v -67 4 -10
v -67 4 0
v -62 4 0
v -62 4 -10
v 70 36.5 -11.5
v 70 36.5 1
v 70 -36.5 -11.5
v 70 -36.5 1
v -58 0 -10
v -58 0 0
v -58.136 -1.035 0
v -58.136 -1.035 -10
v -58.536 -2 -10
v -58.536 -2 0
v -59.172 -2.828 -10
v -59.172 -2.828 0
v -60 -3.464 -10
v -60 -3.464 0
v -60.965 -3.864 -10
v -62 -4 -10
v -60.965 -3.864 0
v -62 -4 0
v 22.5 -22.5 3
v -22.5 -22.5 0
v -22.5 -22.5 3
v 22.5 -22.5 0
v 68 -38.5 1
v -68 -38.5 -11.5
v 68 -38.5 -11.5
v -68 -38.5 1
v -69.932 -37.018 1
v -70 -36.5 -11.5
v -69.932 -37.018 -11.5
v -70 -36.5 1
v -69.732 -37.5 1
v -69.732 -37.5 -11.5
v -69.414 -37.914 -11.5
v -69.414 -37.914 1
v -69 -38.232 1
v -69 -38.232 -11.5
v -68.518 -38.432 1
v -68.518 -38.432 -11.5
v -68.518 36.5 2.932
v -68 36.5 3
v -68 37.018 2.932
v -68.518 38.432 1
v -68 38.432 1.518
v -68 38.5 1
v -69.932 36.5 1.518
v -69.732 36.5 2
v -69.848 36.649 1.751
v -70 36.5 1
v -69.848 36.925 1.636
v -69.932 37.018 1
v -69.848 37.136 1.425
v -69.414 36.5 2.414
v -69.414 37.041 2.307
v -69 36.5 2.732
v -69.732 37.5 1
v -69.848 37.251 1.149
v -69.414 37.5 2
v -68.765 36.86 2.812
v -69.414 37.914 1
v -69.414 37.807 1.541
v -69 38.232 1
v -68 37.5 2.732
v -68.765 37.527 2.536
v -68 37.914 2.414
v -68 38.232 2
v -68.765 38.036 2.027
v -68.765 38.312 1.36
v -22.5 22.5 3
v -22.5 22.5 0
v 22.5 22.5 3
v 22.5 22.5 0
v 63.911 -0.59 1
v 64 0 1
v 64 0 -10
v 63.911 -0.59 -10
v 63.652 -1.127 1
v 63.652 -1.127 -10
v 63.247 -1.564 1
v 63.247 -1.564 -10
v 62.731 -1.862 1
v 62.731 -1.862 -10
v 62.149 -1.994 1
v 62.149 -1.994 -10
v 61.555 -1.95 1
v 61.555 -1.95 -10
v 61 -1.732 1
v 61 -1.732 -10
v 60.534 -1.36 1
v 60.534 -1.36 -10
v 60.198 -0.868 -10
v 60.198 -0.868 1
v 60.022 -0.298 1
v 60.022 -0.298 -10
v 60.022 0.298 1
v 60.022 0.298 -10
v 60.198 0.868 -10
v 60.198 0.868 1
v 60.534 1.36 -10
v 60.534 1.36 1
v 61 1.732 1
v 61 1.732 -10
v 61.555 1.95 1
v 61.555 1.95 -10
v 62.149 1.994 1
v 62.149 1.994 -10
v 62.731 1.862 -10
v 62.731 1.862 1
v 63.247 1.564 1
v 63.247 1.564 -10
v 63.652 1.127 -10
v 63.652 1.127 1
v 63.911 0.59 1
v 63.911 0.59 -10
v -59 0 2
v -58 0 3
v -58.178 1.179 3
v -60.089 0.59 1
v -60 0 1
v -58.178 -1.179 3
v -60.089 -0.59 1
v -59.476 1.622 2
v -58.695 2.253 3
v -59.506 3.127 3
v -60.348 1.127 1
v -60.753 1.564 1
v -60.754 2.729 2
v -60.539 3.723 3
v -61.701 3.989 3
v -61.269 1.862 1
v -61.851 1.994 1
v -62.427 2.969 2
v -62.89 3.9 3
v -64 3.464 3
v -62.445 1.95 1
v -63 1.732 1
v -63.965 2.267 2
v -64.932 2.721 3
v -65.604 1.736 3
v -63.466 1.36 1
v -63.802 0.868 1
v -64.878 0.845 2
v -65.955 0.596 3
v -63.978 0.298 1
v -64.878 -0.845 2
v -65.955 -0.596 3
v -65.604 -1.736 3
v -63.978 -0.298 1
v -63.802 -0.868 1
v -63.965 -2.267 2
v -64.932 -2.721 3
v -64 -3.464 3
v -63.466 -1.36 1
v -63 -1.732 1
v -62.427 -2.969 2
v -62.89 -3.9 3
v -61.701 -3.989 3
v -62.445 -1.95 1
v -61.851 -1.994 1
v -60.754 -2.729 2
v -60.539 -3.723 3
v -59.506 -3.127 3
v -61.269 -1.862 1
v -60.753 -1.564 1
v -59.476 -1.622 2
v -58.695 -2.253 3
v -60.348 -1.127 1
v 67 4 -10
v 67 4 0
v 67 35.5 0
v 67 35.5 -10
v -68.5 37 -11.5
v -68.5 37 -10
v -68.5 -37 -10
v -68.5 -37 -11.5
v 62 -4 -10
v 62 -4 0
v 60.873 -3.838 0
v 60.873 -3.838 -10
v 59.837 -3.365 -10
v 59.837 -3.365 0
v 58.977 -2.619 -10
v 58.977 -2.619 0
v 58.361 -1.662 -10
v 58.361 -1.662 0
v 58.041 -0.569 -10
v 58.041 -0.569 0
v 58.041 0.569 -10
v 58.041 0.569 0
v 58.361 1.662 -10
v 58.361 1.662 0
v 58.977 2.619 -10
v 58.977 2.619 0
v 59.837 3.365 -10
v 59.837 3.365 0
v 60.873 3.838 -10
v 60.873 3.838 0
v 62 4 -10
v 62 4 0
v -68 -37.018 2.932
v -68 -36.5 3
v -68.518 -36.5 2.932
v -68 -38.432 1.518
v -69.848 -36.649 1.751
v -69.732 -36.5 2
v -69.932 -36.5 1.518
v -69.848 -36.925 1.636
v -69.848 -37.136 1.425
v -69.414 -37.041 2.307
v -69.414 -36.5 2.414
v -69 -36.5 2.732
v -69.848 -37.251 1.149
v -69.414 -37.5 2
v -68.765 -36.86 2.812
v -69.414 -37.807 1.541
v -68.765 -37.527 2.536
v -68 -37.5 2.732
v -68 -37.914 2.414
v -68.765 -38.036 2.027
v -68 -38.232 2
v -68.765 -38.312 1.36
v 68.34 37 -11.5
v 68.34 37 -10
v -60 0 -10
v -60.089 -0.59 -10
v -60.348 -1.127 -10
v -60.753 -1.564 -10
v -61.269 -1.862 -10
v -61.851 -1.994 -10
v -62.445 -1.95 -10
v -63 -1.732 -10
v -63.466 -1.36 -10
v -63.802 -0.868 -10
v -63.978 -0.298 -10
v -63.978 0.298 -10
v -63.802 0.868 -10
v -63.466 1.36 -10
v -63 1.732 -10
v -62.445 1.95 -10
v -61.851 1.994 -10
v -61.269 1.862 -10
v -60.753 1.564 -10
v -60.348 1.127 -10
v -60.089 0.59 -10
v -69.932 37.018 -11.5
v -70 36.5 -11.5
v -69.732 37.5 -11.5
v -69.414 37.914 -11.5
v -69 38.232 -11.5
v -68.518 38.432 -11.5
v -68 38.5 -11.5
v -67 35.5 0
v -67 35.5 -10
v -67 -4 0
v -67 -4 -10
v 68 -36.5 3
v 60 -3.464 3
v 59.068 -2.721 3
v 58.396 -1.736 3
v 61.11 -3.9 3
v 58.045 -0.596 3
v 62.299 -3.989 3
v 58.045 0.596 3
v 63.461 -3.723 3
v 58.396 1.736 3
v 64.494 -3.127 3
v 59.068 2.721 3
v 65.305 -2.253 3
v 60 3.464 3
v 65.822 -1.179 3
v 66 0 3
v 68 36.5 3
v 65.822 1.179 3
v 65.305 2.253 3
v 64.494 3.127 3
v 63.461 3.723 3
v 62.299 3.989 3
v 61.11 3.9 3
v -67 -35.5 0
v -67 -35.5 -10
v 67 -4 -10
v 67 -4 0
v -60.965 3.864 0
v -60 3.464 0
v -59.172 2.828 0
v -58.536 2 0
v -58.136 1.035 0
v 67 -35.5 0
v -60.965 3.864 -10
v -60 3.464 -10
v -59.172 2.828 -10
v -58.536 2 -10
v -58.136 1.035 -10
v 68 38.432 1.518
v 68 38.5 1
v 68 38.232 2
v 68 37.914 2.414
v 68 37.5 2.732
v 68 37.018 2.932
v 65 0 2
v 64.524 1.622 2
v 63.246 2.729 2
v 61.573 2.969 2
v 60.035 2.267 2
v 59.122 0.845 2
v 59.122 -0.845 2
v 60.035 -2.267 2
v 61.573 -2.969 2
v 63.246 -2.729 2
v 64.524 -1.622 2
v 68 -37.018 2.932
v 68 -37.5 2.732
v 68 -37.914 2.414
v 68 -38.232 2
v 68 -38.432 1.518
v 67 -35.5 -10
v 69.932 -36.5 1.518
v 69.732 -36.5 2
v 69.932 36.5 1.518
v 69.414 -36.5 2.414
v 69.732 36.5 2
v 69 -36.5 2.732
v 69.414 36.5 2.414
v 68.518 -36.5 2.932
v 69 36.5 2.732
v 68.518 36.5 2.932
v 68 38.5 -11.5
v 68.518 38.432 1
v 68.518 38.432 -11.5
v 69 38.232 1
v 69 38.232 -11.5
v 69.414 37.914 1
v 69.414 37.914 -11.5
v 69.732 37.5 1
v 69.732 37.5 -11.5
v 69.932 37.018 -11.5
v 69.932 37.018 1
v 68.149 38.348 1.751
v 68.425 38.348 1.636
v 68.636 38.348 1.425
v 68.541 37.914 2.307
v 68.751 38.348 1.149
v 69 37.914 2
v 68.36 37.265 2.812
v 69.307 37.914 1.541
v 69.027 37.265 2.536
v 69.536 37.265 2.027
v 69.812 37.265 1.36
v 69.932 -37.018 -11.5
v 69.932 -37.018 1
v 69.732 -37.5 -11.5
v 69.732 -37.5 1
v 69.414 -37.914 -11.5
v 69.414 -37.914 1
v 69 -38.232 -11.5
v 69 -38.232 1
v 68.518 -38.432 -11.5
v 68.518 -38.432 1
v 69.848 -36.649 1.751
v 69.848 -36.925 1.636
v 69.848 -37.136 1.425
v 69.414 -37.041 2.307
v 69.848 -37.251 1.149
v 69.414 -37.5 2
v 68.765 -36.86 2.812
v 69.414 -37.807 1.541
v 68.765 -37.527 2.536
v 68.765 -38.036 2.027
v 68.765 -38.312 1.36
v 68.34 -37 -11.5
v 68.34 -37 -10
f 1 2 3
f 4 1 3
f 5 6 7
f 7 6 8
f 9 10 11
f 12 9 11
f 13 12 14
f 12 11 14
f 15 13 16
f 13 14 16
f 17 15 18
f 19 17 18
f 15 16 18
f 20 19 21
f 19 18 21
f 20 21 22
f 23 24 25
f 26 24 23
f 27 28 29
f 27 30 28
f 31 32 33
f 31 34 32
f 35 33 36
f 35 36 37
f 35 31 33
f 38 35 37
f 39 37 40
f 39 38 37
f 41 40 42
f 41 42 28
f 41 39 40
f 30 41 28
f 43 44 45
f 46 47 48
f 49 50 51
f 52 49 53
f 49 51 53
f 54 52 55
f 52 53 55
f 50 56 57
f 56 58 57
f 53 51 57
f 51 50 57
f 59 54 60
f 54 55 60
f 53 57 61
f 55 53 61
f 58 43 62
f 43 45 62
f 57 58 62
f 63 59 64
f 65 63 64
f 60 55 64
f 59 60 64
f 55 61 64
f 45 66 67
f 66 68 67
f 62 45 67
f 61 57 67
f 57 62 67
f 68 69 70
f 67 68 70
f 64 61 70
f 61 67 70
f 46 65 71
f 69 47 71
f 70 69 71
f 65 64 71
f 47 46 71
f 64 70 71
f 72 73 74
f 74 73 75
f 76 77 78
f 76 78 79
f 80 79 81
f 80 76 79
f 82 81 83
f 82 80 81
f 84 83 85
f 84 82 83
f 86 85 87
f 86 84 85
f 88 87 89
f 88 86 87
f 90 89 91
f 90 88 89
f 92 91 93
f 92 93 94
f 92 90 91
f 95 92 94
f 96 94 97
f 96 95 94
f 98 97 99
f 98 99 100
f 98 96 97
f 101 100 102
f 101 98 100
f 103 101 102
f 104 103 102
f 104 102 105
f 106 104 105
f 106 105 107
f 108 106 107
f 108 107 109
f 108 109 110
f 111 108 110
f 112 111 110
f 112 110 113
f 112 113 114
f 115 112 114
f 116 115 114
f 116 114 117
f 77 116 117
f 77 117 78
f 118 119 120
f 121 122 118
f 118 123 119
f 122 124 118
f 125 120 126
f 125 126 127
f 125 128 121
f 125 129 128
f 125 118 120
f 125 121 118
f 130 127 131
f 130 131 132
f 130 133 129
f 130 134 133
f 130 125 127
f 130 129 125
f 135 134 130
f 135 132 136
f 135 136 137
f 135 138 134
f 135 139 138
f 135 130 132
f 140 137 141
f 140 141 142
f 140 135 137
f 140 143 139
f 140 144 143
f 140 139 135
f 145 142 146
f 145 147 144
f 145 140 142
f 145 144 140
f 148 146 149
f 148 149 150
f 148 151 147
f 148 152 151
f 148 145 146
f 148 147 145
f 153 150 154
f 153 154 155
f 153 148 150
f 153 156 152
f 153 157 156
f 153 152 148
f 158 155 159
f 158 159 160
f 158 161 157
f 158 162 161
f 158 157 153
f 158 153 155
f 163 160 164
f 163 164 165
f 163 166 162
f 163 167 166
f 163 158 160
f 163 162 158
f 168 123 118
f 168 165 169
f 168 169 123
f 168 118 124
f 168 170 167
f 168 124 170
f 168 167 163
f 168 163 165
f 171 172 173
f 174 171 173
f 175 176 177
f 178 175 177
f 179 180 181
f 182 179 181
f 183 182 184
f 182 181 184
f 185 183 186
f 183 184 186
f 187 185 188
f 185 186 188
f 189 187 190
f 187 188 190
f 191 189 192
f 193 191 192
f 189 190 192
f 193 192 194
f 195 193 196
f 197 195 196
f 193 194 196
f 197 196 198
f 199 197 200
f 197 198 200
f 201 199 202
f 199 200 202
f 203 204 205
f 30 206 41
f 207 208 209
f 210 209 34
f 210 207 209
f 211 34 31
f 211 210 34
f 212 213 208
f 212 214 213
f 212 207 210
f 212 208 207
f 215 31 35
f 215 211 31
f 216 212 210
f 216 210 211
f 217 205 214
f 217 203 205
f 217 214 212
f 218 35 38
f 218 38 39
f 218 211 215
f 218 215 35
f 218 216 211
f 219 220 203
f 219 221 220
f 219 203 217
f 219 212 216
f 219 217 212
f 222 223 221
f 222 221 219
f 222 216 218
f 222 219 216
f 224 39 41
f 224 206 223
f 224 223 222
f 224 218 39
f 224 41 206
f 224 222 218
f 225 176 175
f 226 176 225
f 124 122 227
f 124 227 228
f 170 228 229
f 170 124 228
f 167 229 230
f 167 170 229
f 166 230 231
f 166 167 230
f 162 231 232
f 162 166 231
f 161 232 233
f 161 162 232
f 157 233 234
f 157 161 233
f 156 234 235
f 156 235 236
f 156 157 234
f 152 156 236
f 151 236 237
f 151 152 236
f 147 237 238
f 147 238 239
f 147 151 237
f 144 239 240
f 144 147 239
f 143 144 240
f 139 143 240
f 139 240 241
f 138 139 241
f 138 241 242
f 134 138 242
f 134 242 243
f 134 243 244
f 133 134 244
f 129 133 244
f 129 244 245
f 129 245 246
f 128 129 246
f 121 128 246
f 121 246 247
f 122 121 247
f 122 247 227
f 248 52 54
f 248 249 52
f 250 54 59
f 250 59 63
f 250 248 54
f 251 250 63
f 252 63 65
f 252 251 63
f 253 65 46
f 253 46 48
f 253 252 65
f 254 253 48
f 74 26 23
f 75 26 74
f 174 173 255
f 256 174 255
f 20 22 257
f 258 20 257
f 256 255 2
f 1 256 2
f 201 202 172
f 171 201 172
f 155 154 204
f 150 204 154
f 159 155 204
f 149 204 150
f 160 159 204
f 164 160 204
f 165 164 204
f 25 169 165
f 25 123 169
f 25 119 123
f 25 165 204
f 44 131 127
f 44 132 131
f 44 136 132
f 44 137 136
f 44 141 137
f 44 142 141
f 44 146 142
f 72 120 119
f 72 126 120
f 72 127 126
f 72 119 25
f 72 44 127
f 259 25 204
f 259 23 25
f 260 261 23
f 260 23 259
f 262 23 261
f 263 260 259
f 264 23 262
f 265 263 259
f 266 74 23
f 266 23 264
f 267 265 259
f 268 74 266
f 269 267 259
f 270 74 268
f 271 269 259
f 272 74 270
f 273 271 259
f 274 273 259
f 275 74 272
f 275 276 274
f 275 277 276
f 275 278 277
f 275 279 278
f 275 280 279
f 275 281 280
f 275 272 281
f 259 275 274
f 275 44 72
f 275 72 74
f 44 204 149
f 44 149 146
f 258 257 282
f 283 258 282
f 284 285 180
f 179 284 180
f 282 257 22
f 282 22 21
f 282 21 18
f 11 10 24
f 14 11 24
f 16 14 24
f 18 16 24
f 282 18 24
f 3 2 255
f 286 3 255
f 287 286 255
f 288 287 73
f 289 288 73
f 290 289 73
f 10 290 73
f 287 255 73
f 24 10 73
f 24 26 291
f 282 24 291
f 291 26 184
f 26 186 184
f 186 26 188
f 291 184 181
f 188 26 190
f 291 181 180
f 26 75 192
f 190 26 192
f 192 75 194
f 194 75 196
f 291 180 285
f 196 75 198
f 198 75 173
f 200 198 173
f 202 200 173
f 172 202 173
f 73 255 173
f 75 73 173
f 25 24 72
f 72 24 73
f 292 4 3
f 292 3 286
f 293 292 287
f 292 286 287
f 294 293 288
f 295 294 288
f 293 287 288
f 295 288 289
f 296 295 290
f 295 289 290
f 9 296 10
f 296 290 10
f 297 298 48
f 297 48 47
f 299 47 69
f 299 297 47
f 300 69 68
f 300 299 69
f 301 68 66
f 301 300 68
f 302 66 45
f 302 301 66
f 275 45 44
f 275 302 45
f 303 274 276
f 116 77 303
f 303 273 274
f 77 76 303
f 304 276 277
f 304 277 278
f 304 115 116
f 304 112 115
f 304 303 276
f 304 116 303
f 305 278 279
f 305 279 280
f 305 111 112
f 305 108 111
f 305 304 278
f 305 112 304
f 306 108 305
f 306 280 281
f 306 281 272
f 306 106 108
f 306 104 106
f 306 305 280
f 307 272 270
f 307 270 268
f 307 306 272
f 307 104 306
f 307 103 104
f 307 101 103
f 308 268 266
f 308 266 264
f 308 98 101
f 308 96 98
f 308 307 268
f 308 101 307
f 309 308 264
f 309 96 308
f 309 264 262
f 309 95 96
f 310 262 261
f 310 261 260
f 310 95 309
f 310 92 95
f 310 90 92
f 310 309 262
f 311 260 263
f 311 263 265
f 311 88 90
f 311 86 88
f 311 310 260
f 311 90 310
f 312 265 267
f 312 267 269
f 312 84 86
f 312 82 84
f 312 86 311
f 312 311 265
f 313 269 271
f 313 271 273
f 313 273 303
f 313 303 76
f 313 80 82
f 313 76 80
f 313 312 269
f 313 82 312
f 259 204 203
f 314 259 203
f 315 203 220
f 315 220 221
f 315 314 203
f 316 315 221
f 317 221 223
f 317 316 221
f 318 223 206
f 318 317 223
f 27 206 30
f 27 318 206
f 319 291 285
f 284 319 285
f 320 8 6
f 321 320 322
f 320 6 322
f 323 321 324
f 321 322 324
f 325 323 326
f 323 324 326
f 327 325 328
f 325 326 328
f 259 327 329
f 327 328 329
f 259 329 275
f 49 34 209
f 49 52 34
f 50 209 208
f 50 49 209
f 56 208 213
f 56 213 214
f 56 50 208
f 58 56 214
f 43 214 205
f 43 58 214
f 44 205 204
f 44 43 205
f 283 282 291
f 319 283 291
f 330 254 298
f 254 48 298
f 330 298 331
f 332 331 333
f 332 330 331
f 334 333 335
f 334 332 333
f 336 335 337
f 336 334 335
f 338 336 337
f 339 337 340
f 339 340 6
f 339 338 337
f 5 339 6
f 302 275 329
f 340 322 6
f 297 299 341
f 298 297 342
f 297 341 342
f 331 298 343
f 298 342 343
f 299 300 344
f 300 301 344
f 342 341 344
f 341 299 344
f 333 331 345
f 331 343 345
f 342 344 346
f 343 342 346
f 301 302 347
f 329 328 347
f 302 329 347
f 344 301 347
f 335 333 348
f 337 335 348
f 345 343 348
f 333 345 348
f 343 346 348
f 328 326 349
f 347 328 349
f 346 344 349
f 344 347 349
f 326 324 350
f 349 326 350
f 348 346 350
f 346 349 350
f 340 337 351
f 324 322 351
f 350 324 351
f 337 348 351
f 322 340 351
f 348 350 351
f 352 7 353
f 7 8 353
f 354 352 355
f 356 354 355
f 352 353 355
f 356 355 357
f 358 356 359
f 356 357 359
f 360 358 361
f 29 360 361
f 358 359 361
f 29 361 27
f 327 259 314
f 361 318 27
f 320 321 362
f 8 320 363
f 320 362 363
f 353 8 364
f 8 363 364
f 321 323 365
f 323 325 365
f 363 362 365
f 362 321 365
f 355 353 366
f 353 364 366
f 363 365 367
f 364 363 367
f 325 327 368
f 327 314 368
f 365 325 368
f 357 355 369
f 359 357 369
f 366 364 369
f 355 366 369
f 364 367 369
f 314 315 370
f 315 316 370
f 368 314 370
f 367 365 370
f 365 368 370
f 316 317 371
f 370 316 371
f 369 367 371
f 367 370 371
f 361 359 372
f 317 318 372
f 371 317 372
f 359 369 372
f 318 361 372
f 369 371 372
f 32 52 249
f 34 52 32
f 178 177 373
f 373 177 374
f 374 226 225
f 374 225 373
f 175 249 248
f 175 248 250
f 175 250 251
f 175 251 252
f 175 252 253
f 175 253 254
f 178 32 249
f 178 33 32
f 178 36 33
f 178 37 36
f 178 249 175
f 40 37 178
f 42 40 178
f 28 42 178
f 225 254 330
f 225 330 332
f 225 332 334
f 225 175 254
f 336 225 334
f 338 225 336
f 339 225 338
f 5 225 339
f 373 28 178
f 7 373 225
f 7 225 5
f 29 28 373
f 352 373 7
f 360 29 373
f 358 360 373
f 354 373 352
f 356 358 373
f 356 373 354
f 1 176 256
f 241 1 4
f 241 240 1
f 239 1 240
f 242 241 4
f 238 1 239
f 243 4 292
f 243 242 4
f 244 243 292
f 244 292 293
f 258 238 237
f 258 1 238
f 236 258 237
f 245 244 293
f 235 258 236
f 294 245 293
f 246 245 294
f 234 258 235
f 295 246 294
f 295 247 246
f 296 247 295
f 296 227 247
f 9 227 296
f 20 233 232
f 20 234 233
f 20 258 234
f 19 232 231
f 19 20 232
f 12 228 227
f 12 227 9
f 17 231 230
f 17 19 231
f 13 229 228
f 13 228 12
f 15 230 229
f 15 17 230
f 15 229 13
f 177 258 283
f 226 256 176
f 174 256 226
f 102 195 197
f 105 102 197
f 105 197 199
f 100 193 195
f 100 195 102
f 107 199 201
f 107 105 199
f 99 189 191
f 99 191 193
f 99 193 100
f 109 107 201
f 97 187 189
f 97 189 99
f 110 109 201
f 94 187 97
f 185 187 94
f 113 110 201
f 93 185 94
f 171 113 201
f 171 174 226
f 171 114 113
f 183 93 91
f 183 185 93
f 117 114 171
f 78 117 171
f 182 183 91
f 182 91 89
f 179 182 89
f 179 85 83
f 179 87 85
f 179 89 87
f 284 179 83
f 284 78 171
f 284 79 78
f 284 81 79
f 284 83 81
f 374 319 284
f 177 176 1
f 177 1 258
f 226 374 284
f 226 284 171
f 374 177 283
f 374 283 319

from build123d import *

# Parameters (mm, degrees)
F0_W     = 140
F0_H     = 77
F0_R     = 4
F0_W_2   = 45
F0_H_2   = 45
F0_R_2   = 2
F1_DEPTH = 3
F2_W     = 140
F2_H     = 77
F2_R     = 2
F3_DEPTH = 10
F4_W     = 140
F4_H     = 77
F4_W_2   = 136.839989
F4_H_2   = 74
F5_DEPTH = 1.5
F6_R     = 2
F7_SIZE  = 2


with BuildPart() as f1:
    # F0 (on Top) → F1 (new body)
    with BuildSketch(Plane.XY):
        Rectangle(F0_W, F0_H)
        with Locations((-62, 0)):
            Circle(F0_R, mode=Mode.SUBTRACT)
        Rectangle(F0_W_2, F0_H_2, mode=Mode.SUBTRACT)
        with Locations((62, 0)):
            Circle(F0_R, mode=Mode.SUBTRACT)
        with Locations((-62, 0)):
            Circle(F0_R)
        with Locations((-62, 0)):
            Circle(F0_R_2, mode=Mode.SUBTRACT)
        with Locations((62, 0)):
            Circle(F0_R)
        with Locations((62, 0)):
            Circle(F0_R_2, mode=Mode.SUBTRACT)
    extrude(amount=F1_DEPTH)

    # F2 (on face) → F3 (join)
    with BuildSketch(Plane(origin=(0, 0, 0), x_dir=(1, 0, 0), z_dir=(0, 0, -1))):
        Rectangle(F2_W, F2_H)
        Polygon((-67, 4), (-67, 35.5), (67, 35.5), (67, 4), (67, -4), (67, -35.5), (-67, -35.5), (-67, -4), align=None, mode=Mode.SUBTRACT)
        with BuildLine():
            ThreePointArc((-58, 0), (-59.171573, 2.828427), (-62, 4))
            ThreePointArc((-62, 4), (-66, 0), (-62, -4))
            ThreePointArc((-62, -4), (-59.171573, -2.828427), (-58, 0))
        make_face()
        with Locations((-62, 0)):
            Circle(F2_R, mode=Mode.SUBTRACT)
        with BuildLine():
            ThreePointArc((66, 0), (64.828427, 2.828427), (62, 4))
            ThreePointArc((62, 4), (58, 0), (62, -4))
            ThreePointArc((62, -4), (64.828427, -2.828427), (66, 0))
        make_face()
        with Locations((62, 0)):
            Circle(F2_R, mode=Mode.SUBTRACT)
        with BuildLine():
            Line((-62, 4), (-67, 4))
            Line((-67, 4), (-67, -4))
            Line((-67, -4), (-62, -4))
            ThreePointArc((-62, -4), (-66, 0), (-62, 4))
        make_face()
        with BuildLine():
            Line((67, -4), (67, 4))
            Line((67, 4), (62, 4))
            ThreePointArc((62, 4), (64.828427, 2.828427), (66, 0))
            ThreePointArc((66, 0), (64.828427, -2.828427), (62, -4))
            Line((62, -4), (67, -4))
        make_face()
    extrude(amount=F3_DEPTH)

    # F4 (on face) → F5 (join)
    with BuildSketch(Plane(origin=(0, 0, -10), x_dir=(1, 0, 0), z_dir=(0, 0, -1))):
        Rectangle(F4_W, F4_H)
        with Locations((-0.080005, 0)):
            Rectangle(F4_W_2, F4_H_2, mode=Mode.SUBTRACT)
    extrude(amount=F5_DEPTH)

    # F6
    f6_edges = [f1.edges().sort_by_distance(p)[0] for p in [
        (0, -38.5, 3),
        (70, 0, 3),
        (0, 38.5, 3),
        (-70, 0, 3),
        (-70, 38.5, -4.25),
        (-70, -38.5, -4.25),
        (70, -38.5, -4.25),
        (70, 38.5, -4.25),
    ]]
    fillet(f6_edges, radius=F6_R)

    # F7
    f7_edges = [f1.edges().sort_by_distance(p)[0] for p in [
        (-64, 0, 3),
        (60, 0, 3),
    ]]
    chamfer(f7_edges, length=F7_SIZE)


solid = f1.part
